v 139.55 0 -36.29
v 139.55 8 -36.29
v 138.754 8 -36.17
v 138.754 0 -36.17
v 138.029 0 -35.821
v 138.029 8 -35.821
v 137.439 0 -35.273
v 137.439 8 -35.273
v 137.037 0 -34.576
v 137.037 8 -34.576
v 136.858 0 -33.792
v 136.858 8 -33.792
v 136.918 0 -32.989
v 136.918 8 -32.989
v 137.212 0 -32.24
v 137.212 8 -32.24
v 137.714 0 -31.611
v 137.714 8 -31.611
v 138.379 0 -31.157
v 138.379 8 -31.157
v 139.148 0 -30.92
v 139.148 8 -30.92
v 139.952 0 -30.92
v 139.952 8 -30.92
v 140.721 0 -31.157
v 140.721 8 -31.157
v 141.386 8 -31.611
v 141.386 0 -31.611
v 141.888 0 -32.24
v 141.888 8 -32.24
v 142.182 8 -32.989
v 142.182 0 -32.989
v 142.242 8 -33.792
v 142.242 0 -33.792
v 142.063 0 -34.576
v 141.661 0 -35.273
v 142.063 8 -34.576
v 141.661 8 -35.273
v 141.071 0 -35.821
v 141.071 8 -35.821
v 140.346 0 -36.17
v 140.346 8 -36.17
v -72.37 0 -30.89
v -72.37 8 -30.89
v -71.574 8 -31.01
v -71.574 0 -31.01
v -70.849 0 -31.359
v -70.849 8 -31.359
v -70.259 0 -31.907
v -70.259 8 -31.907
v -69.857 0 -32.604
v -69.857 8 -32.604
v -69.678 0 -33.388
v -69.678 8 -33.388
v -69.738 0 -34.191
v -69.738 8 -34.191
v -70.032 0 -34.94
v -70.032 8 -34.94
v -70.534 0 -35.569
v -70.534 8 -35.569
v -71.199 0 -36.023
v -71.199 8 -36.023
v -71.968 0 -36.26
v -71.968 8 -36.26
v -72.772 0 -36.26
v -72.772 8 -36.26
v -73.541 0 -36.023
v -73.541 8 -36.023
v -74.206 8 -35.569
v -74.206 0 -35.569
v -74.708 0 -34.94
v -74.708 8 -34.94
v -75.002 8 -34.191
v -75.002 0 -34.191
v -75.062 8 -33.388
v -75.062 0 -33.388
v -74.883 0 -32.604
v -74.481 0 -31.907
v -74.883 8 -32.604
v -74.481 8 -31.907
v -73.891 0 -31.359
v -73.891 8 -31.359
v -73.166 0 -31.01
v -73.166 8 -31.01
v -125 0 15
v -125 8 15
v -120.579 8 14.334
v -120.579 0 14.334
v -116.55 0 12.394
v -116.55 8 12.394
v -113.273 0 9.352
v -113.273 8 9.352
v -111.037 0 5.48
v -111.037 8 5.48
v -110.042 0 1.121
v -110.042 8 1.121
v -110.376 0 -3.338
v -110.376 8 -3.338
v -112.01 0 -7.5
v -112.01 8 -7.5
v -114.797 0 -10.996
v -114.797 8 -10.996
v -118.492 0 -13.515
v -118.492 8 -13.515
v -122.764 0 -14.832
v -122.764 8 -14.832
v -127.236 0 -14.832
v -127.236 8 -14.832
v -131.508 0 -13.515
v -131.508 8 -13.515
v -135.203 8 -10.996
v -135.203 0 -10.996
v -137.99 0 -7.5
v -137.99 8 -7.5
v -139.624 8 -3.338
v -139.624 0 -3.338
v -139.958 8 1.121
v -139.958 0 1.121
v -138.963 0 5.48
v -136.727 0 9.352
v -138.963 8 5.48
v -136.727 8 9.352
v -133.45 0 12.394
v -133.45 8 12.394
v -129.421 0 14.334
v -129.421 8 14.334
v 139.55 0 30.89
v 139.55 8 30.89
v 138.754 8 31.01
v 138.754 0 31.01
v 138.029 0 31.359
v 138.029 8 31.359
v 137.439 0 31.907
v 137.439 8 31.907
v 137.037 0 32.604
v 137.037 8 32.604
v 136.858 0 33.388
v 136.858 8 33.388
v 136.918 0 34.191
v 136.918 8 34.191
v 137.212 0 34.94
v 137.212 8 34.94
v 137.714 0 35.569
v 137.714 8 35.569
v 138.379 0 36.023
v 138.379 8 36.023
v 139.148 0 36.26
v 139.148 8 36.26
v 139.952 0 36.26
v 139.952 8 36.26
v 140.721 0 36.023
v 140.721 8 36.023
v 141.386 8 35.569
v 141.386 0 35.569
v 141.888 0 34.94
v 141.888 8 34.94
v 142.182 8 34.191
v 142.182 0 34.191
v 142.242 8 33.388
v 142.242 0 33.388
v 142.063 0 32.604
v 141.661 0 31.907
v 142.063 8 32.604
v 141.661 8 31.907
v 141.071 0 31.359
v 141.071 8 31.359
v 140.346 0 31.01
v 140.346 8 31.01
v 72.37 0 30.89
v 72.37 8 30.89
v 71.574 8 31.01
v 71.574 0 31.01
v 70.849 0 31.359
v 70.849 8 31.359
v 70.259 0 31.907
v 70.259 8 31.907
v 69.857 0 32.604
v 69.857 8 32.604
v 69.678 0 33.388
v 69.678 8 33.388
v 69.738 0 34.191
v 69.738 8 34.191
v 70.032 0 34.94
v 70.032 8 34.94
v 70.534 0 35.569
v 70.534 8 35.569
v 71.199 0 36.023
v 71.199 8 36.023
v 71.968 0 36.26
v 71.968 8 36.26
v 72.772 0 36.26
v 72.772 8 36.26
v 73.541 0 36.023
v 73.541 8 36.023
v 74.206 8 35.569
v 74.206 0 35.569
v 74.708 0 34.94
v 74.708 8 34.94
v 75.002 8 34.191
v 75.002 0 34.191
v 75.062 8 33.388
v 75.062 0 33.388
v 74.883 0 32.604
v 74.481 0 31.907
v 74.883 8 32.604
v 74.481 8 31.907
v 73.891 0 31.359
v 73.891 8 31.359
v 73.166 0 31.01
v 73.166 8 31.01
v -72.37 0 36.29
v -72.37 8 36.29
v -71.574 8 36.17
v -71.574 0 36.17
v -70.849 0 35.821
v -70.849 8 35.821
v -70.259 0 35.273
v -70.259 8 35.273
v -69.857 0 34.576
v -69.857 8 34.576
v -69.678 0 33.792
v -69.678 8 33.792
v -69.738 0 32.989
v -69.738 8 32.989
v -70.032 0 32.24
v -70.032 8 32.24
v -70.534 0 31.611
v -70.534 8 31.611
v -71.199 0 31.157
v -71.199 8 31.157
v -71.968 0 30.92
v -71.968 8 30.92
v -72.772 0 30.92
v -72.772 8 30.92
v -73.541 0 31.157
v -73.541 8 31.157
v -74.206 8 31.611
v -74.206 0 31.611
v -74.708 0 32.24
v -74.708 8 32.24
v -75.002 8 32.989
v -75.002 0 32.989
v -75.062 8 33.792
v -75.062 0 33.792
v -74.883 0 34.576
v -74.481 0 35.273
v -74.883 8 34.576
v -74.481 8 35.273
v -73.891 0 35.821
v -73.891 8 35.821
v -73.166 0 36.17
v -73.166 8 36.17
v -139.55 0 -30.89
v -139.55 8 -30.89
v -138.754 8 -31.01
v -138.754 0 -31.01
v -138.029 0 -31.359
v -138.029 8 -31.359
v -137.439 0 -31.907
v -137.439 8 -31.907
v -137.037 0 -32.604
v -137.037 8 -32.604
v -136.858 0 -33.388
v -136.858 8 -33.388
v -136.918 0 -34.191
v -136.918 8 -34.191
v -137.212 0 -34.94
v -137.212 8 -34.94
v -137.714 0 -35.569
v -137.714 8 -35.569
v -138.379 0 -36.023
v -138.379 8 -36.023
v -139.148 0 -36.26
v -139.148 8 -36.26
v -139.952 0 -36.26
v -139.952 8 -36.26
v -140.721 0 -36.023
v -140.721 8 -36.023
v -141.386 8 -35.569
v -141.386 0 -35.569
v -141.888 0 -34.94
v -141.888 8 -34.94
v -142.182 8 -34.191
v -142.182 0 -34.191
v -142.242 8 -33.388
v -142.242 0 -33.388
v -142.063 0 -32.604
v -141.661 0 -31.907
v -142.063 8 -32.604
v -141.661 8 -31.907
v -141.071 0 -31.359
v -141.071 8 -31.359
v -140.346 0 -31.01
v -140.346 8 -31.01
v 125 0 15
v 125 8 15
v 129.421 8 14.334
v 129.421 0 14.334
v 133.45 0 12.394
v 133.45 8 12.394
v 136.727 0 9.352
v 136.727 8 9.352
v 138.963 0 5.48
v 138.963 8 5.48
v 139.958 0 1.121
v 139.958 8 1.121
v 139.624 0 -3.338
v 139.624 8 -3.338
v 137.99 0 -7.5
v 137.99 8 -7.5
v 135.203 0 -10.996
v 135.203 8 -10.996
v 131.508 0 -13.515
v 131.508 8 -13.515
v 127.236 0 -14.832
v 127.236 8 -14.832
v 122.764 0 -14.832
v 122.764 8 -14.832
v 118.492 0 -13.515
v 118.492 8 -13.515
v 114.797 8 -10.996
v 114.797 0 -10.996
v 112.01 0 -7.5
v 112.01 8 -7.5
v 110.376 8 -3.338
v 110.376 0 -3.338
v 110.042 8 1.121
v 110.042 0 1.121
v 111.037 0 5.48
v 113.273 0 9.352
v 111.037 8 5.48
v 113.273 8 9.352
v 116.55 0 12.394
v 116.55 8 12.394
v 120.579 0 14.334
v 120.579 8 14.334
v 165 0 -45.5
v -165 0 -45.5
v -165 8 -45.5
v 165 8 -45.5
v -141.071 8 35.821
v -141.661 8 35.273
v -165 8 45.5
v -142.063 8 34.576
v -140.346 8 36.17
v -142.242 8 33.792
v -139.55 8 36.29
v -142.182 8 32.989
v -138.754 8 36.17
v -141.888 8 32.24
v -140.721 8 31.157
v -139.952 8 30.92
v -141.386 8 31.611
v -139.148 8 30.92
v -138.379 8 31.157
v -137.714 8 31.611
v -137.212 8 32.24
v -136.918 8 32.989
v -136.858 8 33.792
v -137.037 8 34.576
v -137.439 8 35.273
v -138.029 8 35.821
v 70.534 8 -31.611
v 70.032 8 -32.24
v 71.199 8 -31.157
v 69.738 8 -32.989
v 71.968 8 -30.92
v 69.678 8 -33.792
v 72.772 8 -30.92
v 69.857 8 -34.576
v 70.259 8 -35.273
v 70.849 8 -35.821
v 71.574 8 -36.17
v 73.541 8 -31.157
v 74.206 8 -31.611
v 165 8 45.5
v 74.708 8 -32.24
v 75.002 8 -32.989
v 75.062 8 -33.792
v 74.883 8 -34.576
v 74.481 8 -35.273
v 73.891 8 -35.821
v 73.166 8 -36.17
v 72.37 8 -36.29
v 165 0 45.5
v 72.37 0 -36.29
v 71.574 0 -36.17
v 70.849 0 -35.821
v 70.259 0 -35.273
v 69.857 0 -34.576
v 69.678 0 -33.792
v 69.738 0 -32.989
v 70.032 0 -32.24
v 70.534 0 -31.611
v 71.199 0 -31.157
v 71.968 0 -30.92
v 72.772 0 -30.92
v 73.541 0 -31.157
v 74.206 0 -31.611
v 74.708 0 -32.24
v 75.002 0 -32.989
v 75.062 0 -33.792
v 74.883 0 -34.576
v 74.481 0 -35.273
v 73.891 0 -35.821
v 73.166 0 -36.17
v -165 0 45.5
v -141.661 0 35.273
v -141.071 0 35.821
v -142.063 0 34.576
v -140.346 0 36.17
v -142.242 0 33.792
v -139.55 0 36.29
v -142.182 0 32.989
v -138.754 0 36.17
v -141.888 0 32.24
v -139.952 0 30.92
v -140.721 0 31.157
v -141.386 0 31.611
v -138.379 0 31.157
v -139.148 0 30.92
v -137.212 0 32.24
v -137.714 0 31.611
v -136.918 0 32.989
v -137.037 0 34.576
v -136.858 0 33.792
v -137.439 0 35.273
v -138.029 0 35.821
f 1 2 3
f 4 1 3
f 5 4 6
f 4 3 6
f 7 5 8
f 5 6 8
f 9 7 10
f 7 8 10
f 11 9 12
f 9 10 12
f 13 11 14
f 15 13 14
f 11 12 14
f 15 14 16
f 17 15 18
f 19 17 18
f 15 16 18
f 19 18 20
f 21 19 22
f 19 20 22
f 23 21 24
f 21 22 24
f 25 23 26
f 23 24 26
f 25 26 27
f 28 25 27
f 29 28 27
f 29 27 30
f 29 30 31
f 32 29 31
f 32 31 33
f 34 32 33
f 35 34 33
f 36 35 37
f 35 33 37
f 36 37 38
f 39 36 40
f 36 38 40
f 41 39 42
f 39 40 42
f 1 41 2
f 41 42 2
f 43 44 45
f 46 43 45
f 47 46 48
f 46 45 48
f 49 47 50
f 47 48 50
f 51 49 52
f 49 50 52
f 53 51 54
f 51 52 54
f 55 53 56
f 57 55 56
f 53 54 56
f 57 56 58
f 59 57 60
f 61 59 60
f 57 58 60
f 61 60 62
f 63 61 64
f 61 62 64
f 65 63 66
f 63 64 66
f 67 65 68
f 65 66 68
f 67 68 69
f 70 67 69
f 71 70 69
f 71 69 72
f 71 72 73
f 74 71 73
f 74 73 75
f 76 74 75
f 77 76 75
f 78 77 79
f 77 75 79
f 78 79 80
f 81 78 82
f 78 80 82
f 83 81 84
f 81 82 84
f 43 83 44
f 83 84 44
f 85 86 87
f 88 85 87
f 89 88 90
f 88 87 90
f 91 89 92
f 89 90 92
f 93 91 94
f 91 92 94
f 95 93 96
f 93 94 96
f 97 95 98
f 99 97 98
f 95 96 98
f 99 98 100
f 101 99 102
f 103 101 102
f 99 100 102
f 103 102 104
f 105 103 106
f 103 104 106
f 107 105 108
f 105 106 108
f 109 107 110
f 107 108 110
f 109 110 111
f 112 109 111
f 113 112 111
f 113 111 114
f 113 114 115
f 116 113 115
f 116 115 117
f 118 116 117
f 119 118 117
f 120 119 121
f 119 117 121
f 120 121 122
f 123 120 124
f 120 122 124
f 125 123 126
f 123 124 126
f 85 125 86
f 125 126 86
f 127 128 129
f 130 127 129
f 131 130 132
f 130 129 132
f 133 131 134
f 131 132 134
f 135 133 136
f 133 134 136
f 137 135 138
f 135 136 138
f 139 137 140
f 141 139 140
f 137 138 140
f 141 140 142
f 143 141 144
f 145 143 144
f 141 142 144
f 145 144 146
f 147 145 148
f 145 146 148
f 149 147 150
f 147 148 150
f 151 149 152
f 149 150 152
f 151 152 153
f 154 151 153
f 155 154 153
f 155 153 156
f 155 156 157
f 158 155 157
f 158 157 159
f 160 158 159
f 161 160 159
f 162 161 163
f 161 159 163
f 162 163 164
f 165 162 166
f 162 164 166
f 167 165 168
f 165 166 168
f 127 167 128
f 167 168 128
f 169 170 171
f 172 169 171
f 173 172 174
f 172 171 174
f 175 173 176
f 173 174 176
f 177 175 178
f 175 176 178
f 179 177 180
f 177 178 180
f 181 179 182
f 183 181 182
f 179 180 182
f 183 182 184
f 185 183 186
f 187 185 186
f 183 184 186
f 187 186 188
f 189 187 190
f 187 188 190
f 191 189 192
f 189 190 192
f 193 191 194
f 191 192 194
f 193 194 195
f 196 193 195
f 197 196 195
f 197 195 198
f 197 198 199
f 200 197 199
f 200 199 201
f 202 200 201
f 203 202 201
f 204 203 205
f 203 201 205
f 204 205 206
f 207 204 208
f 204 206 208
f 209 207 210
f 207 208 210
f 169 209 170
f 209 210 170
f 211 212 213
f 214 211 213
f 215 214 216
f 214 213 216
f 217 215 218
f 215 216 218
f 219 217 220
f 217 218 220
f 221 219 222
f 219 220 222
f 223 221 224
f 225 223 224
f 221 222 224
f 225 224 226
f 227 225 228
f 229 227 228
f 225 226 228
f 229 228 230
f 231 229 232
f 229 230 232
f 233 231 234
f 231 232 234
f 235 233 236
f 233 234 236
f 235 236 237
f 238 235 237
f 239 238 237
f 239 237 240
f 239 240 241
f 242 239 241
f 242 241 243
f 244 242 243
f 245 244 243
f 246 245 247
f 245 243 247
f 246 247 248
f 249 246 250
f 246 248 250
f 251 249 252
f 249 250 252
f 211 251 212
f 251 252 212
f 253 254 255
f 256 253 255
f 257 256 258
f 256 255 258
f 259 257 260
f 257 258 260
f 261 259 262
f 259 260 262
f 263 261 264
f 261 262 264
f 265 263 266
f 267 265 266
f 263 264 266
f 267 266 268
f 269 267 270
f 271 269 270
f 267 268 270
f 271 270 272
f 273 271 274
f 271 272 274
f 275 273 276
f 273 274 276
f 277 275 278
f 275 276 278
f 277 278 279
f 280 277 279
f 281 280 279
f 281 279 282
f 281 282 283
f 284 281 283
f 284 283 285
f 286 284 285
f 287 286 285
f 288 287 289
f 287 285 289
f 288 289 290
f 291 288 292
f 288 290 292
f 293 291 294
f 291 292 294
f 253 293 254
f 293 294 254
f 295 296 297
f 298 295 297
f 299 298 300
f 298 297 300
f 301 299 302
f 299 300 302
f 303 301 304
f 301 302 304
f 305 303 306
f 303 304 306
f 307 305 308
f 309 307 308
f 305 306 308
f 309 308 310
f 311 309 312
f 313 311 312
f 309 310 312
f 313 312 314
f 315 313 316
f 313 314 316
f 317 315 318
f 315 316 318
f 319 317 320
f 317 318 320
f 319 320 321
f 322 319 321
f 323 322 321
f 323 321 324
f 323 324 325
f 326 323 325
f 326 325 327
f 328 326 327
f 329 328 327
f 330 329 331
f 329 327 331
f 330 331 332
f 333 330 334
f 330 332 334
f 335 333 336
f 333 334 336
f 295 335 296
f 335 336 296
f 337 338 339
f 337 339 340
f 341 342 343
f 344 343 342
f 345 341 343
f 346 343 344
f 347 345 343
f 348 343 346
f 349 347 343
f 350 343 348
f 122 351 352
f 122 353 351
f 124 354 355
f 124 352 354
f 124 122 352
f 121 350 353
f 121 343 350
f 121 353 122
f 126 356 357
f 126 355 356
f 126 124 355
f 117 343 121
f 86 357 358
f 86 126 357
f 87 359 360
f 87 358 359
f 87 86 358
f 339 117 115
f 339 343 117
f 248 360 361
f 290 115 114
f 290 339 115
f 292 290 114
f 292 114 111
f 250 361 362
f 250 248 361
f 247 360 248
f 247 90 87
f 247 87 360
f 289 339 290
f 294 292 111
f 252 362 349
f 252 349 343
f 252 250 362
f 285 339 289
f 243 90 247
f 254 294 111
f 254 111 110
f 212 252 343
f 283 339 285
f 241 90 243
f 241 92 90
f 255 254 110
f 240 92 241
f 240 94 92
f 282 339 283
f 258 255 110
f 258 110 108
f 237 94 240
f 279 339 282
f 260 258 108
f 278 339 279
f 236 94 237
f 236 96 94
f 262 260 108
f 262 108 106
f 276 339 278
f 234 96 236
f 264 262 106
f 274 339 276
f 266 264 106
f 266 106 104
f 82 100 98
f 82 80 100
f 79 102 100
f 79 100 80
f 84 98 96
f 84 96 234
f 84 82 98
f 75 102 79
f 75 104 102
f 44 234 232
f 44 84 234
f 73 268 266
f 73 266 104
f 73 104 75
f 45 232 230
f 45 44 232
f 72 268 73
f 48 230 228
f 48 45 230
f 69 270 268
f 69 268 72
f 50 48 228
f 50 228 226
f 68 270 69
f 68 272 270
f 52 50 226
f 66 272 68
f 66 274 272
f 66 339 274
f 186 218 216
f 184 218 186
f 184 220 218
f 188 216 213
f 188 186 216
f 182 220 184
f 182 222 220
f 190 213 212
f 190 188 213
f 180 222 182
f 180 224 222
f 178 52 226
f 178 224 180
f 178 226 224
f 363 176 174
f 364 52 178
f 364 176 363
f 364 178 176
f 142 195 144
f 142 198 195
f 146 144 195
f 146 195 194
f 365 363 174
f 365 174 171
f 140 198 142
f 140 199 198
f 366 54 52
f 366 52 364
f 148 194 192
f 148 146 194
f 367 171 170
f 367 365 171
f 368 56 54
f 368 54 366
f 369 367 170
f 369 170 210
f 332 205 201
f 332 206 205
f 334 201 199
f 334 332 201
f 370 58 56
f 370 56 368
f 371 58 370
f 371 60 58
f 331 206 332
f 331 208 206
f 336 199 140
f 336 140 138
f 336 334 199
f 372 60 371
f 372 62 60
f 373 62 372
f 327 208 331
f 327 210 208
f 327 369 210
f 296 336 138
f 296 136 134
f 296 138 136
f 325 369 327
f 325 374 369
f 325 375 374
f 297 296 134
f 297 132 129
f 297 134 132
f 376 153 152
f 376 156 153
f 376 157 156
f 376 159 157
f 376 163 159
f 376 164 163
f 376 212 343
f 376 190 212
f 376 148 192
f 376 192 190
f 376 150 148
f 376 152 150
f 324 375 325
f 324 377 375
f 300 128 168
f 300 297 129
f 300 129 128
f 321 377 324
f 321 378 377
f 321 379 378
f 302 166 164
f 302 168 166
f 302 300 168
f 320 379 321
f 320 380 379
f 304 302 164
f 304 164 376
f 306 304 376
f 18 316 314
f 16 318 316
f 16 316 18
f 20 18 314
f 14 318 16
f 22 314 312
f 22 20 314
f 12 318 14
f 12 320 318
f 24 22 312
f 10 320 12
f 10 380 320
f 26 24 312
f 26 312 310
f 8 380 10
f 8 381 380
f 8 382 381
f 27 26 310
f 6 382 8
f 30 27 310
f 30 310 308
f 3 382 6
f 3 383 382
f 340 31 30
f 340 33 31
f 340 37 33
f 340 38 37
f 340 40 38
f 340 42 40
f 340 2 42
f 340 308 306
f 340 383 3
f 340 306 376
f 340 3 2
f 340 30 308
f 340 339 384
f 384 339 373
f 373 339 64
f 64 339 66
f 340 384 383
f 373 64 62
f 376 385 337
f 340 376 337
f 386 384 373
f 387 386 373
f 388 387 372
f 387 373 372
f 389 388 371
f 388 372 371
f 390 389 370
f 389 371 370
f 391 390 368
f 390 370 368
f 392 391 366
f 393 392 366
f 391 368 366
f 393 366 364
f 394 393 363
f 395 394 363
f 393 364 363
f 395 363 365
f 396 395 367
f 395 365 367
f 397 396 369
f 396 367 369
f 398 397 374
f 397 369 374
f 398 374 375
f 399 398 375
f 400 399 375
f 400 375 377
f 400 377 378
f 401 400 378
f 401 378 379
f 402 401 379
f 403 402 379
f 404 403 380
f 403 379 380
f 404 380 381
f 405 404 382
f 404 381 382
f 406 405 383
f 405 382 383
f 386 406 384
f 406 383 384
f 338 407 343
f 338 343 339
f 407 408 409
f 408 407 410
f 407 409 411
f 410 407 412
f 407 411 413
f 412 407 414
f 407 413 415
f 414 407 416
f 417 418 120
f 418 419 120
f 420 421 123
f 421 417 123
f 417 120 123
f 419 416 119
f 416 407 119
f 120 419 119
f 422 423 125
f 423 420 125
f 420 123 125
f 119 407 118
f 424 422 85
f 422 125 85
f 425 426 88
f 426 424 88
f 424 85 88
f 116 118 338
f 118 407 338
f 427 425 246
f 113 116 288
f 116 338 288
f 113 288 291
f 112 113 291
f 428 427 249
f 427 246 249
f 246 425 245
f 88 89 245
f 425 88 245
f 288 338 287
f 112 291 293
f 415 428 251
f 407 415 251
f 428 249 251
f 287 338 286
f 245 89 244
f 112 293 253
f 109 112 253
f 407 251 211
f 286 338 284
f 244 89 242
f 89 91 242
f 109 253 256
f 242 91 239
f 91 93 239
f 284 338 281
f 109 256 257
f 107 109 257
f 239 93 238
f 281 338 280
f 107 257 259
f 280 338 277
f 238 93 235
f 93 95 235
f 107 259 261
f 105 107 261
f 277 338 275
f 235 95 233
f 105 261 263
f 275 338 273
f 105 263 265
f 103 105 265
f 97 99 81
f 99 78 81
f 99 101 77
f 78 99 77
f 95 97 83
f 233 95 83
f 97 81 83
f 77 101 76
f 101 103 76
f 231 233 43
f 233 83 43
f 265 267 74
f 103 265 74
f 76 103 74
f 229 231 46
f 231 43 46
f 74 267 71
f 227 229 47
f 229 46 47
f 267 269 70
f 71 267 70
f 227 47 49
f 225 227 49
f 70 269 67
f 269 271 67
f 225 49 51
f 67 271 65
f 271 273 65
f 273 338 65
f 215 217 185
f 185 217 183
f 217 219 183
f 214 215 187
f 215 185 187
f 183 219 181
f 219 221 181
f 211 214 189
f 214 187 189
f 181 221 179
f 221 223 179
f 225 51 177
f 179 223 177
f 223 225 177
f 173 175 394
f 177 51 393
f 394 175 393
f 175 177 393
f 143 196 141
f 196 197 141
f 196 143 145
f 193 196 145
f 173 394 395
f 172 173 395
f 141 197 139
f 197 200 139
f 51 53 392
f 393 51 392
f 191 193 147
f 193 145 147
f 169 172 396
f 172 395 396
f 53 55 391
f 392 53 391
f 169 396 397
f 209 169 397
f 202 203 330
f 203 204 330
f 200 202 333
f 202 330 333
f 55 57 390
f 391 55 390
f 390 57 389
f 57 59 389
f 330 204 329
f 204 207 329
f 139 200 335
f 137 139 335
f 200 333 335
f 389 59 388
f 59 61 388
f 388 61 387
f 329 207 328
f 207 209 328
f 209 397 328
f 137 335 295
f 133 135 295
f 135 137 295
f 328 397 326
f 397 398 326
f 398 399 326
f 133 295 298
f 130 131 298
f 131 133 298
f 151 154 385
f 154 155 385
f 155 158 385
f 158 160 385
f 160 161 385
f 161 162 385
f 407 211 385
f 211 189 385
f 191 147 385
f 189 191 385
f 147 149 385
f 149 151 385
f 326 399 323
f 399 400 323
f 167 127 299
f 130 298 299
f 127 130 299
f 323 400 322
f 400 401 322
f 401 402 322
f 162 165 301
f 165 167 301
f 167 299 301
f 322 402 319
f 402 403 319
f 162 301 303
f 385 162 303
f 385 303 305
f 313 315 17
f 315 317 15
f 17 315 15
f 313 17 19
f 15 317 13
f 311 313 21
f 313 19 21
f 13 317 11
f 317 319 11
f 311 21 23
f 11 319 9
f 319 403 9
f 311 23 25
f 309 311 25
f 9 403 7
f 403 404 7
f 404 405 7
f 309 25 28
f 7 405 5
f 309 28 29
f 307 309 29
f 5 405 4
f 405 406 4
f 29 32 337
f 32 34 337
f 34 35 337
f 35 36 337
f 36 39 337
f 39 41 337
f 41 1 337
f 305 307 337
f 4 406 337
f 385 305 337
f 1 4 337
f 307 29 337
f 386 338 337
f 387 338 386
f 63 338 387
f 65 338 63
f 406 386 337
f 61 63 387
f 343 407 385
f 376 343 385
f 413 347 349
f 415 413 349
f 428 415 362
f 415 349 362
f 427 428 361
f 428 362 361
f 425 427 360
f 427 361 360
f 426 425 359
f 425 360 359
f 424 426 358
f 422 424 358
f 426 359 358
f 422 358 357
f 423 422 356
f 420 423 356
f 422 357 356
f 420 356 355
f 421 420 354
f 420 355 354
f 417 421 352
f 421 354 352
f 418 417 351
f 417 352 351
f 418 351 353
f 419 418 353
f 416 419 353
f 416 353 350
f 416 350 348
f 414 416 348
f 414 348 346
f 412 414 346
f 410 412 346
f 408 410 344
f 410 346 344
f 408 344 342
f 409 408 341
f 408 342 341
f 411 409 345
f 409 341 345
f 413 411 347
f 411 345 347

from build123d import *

# Parameters (mm, degrees)
SKETCH1_W           = 330
SKETCH1_H           = 91
BOSS_EXTRUDE2_DEPTH = 8
SKETCH4_R           = 15
SKETCH4_R_2         = 2.7
CUT_EXTRUDE4_DEPTH  = 8


with BuildPart() as part:
    # Sketch1 → Boss-Extrude2 (new body)
    with BuildSketch(Plane(origin=(0, 0, 0), x_dir=(1, 0, 0), z_dir=(0, 1, 0))):
        Rectangle(SKETCH1_W, SKETCH1_H)
    extrude(amount=BOSS_EXTRUDE2_DEPTH)

    # Sketch4 → Cut-Extrude4 (cut)
    with BuildSketch(Plane(origin=(0, 8, 0), x_dir=(1, 0, 0), z_dir=(0, 1, 0))):
        with Locations(Location((125, 0, 0), (0, 0, 270))):
            Circle(SKETCH4_R)
        with Locations(Location((-125, 0, 0), (0, 0, 270))):
            Circle(SKETCH4_R)
        with Locations(Location((-139.55, 33.59, 0), (0, 0, 270))):
            Circle(SKETCH4_R_2)
        with Locations(Location((-139.55, -33.59, 0), (0, 0, 270))):
            Circle(SKETCH4_R_2)
        with Locations(Location((-72.37, -33.59, 0), (0, 0, 270))):
            Circle(SKETCH4_R_2)
        with Locations(Location((-72.37, 33.59, 0), (0, 0, 270))):
            Circle(SKETCH4_R_2)
        with Locations(Location((139.55, -33.59, 0), (0, 0, 90))):
            Circle(SKETCH4_R_2)
        with Locations(Location((72.37, -33.59, 0), (0, 0, 90))):
            Circle(SKETCH4_R_2)
        with Locations(Location((72.37, 33.59, 0), (0, 0, 90))):
            Circle(SKETCH4_R_2)
        with Locations(Location((139.55, 33.59, 0), (0, 0, 90))):
            Circle(SKETCH4_R_2)
    extrude(amount=-CUT_EXTRUDE4_DEPTH, mode=Mode.SUBTRACT)


solid = part.part
